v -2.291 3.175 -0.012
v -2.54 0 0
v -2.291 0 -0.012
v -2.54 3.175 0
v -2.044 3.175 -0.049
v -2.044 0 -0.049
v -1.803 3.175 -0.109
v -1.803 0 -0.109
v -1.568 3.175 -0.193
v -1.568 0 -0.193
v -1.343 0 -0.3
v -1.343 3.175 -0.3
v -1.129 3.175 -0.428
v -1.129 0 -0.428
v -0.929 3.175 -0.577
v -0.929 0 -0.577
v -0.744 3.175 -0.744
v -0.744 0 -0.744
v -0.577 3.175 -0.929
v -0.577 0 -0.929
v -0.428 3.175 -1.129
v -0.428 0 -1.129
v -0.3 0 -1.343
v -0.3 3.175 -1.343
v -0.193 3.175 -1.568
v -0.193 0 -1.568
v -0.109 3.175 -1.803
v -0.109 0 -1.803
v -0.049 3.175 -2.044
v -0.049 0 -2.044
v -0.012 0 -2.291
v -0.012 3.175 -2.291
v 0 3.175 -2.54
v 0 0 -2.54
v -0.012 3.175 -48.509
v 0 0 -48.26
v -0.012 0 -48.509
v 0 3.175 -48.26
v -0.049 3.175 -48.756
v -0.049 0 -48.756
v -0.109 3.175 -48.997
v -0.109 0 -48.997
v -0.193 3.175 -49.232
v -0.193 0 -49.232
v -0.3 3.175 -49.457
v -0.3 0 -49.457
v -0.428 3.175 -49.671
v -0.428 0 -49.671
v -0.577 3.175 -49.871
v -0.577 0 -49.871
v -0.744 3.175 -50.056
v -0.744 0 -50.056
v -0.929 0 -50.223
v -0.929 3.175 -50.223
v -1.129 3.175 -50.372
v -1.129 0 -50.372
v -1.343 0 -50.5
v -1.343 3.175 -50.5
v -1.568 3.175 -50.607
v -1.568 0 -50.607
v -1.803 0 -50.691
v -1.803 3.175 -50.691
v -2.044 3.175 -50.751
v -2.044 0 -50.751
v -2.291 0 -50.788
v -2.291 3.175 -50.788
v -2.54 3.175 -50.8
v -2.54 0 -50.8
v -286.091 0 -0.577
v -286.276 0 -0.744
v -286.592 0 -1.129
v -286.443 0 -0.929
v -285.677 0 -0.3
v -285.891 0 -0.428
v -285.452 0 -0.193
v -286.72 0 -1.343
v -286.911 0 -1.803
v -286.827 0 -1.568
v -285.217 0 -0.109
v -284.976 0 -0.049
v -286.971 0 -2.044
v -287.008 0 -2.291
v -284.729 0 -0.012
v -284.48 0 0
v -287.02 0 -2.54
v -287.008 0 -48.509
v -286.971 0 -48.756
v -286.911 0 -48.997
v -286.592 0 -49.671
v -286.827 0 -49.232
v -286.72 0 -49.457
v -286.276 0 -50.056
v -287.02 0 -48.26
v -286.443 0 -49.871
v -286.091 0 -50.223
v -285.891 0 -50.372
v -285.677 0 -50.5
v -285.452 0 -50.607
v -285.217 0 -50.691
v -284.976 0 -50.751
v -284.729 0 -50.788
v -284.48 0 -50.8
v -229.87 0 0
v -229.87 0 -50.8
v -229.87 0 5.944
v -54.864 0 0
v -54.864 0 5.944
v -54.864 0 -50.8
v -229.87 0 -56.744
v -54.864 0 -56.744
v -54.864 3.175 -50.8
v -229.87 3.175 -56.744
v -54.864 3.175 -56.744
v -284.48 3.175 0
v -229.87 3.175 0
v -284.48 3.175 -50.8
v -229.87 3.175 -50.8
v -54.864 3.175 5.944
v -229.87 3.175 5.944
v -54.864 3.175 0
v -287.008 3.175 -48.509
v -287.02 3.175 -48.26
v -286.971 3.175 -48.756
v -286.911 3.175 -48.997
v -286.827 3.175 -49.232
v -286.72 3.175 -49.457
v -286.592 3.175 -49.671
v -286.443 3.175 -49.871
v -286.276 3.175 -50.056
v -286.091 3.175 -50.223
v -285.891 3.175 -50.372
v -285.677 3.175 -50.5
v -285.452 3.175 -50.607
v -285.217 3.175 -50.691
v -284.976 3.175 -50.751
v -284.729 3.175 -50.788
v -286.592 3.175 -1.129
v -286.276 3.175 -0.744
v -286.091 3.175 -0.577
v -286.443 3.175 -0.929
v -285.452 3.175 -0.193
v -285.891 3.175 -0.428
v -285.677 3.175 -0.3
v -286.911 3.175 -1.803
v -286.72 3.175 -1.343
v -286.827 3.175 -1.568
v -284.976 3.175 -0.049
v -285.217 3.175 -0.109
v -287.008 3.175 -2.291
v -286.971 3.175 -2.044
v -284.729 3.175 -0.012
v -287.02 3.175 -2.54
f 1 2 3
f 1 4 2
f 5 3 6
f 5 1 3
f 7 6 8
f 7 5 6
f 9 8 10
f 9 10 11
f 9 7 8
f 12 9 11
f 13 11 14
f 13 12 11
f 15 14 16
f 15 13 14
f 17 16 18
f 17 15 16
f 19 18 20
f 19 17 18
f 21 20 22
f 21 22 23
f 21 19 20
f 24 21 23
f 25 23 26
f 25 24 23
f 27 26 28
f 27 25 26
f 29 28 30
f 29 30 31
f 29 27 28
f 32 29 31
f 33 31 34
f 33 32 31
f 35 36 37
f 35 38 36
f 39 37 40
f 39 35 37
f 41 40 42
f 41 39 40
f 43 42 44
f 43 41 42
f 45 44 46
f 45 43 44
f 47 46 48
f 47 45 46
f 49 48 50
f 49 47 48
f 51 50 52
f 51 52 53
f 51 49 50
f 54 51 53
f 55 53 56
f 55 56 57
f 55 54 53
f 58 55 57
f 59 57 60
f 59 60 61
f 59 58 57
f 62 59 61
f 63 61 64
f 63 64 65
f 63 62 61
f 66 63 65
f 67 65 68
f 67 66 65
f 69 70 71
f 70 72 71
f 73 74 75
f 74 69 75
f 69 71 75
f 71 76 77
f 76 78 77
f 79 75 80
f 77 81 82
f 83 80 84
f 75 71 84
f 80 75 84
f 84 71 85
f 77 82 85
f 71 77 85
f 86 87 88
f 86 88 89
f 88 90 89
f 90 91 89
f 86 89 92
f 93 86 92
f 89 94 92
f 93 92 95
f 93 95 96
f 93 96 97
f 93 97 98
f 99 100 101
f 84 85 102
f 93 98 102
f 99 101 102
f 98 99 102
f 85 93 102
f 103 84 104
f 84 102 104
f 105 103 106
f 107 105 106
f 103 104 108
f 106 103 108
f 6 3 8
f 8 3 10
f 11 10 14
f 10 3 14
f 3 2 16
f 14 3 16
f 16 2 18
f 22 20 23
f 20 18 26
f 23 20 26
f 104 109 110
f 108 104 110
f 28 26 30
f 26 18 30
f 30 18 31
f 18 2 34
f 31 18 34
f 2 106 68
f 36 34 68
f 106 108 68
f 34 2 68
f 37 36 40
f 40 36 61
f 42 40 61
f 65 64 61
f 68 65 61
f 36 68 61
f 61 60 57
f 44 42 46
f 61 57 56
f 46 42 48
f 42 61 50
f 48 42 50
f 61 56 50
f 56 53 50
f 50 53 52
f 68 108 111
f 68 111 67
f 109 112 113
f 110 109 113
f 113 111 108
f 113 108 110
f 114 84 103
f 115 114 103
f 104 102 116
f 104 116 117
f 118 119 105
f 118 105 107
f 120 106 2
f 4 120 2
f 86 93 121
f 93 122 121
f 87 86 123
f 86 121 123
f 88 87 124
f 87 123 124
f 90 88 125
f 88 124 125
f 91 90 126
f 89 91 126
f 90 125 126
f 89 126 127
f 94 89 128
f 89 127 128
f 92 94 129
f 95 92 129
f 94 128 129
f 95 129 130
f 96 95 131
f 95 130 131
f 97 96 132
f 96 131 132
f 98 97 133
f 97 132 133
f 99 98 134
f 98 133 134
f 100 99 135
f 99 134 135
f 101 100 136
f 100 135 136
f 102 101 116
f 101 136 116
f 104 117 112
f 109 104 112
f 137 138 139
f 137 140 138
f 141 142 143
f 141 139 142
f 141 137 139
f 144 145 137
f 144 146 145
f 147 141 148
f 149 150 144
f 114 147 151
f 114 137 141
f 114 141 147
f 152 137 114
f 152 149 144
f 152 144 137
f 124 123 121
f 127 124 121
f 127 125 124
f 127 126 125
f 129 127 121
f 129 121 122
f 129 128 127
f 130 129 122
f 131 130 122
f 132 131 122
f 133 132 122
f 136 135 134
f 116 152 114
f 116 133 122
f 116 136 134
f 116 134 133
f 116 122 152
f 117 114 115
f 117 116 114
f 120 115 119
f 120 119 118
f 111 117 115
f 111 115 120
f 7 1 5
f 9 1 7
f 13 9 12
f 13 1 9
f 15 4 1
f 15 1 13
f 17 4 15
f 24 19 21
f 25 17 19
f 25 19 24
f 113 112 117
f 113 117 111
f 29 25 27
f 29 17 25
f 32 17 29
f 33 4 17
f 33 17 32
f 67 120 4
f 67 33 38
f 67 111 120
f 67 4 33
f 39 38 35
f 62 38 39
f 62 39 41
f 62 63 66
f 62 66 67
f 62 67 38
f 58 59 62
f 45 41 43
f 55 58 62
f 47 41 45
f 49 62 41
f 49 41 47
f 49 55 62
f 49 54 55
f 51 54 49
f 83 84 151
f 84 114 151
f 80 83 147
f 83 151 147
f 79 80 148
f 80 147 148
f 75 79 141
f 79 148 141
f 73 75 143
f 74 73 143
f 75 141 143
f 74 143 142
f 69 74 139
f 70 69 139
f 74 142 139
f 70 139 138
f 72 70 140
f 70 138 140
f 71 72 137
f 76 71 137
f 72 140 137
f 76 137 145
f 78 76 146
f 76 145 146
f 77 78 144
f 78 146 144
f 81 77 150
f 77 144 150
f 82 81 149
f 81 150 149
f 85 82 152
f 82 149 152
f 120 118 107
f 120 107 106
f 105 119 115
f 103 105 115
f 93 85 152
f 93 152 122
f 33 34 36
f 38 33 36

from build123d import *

# Parameters (mm, degrees)
SKETCH1_W           = 287.02
SKETCH1_H           = 50.8
BOSS_EXTRUDE1_DEPTH = 3.175
SKETCH2_W           = 175.006
SKETCH2_H           = 5.9436
BOSS_EXTRUDE2_DEPTH = 3.175
FILLET1_R           = 2.54
FILLET2_R           = 2.54


with BuildPart() as part:
    # Sketch1 → Boss-Extrude1 (new body)
    with BuildSketch(Plane(origin=(0, 0, 0), x_dir=(1, 0, 0), z_dir=(0, 1, 0))):
        with Locations((-143.51, 25.4)):
            Rectangle(SKETCH1_W, SKETCH1_H)
    extrude(amount=BOSS_EXTRUDE1_DEPTH)

    # Sketch2 → Boss-Extrude2 (add)
    with BuildSketch(Plane(origin=(0, 3.175, 0), x_dir=(1, 0, 0), z_dir=(0, 1, 0))):
        with Locations((-142.367, -2.9718)):
            Rectangle(SKETCH2_W, SKETCH2_H)
        with Locations((-142.367, 53.7718)):
            Rectangle(SKETCH2_W, SKETCH2_H)
    extrude(amount=-BOSS_EXTRUDE2_DEPTH)

    # Fillet1
    fillet1_edges = [part.edges().sort_by_distance(p)[0] for p in [
        (0, 1.5875, -50.8),
        (0, 1.5875, 0),
    ]]
    fillet(fillet1_edges, radius=FILLET1_R)

    # Fillet2
    fillet2_edges = [part.edges().sort_by_distance(p)[0] for p in [
        (-287.02, 1.5875, 0),
        (-287.02, 1.5875, -50.8),
    ]]
    fillet(fillet2_edges, radius=FILLET2_R)


solid = part.part
